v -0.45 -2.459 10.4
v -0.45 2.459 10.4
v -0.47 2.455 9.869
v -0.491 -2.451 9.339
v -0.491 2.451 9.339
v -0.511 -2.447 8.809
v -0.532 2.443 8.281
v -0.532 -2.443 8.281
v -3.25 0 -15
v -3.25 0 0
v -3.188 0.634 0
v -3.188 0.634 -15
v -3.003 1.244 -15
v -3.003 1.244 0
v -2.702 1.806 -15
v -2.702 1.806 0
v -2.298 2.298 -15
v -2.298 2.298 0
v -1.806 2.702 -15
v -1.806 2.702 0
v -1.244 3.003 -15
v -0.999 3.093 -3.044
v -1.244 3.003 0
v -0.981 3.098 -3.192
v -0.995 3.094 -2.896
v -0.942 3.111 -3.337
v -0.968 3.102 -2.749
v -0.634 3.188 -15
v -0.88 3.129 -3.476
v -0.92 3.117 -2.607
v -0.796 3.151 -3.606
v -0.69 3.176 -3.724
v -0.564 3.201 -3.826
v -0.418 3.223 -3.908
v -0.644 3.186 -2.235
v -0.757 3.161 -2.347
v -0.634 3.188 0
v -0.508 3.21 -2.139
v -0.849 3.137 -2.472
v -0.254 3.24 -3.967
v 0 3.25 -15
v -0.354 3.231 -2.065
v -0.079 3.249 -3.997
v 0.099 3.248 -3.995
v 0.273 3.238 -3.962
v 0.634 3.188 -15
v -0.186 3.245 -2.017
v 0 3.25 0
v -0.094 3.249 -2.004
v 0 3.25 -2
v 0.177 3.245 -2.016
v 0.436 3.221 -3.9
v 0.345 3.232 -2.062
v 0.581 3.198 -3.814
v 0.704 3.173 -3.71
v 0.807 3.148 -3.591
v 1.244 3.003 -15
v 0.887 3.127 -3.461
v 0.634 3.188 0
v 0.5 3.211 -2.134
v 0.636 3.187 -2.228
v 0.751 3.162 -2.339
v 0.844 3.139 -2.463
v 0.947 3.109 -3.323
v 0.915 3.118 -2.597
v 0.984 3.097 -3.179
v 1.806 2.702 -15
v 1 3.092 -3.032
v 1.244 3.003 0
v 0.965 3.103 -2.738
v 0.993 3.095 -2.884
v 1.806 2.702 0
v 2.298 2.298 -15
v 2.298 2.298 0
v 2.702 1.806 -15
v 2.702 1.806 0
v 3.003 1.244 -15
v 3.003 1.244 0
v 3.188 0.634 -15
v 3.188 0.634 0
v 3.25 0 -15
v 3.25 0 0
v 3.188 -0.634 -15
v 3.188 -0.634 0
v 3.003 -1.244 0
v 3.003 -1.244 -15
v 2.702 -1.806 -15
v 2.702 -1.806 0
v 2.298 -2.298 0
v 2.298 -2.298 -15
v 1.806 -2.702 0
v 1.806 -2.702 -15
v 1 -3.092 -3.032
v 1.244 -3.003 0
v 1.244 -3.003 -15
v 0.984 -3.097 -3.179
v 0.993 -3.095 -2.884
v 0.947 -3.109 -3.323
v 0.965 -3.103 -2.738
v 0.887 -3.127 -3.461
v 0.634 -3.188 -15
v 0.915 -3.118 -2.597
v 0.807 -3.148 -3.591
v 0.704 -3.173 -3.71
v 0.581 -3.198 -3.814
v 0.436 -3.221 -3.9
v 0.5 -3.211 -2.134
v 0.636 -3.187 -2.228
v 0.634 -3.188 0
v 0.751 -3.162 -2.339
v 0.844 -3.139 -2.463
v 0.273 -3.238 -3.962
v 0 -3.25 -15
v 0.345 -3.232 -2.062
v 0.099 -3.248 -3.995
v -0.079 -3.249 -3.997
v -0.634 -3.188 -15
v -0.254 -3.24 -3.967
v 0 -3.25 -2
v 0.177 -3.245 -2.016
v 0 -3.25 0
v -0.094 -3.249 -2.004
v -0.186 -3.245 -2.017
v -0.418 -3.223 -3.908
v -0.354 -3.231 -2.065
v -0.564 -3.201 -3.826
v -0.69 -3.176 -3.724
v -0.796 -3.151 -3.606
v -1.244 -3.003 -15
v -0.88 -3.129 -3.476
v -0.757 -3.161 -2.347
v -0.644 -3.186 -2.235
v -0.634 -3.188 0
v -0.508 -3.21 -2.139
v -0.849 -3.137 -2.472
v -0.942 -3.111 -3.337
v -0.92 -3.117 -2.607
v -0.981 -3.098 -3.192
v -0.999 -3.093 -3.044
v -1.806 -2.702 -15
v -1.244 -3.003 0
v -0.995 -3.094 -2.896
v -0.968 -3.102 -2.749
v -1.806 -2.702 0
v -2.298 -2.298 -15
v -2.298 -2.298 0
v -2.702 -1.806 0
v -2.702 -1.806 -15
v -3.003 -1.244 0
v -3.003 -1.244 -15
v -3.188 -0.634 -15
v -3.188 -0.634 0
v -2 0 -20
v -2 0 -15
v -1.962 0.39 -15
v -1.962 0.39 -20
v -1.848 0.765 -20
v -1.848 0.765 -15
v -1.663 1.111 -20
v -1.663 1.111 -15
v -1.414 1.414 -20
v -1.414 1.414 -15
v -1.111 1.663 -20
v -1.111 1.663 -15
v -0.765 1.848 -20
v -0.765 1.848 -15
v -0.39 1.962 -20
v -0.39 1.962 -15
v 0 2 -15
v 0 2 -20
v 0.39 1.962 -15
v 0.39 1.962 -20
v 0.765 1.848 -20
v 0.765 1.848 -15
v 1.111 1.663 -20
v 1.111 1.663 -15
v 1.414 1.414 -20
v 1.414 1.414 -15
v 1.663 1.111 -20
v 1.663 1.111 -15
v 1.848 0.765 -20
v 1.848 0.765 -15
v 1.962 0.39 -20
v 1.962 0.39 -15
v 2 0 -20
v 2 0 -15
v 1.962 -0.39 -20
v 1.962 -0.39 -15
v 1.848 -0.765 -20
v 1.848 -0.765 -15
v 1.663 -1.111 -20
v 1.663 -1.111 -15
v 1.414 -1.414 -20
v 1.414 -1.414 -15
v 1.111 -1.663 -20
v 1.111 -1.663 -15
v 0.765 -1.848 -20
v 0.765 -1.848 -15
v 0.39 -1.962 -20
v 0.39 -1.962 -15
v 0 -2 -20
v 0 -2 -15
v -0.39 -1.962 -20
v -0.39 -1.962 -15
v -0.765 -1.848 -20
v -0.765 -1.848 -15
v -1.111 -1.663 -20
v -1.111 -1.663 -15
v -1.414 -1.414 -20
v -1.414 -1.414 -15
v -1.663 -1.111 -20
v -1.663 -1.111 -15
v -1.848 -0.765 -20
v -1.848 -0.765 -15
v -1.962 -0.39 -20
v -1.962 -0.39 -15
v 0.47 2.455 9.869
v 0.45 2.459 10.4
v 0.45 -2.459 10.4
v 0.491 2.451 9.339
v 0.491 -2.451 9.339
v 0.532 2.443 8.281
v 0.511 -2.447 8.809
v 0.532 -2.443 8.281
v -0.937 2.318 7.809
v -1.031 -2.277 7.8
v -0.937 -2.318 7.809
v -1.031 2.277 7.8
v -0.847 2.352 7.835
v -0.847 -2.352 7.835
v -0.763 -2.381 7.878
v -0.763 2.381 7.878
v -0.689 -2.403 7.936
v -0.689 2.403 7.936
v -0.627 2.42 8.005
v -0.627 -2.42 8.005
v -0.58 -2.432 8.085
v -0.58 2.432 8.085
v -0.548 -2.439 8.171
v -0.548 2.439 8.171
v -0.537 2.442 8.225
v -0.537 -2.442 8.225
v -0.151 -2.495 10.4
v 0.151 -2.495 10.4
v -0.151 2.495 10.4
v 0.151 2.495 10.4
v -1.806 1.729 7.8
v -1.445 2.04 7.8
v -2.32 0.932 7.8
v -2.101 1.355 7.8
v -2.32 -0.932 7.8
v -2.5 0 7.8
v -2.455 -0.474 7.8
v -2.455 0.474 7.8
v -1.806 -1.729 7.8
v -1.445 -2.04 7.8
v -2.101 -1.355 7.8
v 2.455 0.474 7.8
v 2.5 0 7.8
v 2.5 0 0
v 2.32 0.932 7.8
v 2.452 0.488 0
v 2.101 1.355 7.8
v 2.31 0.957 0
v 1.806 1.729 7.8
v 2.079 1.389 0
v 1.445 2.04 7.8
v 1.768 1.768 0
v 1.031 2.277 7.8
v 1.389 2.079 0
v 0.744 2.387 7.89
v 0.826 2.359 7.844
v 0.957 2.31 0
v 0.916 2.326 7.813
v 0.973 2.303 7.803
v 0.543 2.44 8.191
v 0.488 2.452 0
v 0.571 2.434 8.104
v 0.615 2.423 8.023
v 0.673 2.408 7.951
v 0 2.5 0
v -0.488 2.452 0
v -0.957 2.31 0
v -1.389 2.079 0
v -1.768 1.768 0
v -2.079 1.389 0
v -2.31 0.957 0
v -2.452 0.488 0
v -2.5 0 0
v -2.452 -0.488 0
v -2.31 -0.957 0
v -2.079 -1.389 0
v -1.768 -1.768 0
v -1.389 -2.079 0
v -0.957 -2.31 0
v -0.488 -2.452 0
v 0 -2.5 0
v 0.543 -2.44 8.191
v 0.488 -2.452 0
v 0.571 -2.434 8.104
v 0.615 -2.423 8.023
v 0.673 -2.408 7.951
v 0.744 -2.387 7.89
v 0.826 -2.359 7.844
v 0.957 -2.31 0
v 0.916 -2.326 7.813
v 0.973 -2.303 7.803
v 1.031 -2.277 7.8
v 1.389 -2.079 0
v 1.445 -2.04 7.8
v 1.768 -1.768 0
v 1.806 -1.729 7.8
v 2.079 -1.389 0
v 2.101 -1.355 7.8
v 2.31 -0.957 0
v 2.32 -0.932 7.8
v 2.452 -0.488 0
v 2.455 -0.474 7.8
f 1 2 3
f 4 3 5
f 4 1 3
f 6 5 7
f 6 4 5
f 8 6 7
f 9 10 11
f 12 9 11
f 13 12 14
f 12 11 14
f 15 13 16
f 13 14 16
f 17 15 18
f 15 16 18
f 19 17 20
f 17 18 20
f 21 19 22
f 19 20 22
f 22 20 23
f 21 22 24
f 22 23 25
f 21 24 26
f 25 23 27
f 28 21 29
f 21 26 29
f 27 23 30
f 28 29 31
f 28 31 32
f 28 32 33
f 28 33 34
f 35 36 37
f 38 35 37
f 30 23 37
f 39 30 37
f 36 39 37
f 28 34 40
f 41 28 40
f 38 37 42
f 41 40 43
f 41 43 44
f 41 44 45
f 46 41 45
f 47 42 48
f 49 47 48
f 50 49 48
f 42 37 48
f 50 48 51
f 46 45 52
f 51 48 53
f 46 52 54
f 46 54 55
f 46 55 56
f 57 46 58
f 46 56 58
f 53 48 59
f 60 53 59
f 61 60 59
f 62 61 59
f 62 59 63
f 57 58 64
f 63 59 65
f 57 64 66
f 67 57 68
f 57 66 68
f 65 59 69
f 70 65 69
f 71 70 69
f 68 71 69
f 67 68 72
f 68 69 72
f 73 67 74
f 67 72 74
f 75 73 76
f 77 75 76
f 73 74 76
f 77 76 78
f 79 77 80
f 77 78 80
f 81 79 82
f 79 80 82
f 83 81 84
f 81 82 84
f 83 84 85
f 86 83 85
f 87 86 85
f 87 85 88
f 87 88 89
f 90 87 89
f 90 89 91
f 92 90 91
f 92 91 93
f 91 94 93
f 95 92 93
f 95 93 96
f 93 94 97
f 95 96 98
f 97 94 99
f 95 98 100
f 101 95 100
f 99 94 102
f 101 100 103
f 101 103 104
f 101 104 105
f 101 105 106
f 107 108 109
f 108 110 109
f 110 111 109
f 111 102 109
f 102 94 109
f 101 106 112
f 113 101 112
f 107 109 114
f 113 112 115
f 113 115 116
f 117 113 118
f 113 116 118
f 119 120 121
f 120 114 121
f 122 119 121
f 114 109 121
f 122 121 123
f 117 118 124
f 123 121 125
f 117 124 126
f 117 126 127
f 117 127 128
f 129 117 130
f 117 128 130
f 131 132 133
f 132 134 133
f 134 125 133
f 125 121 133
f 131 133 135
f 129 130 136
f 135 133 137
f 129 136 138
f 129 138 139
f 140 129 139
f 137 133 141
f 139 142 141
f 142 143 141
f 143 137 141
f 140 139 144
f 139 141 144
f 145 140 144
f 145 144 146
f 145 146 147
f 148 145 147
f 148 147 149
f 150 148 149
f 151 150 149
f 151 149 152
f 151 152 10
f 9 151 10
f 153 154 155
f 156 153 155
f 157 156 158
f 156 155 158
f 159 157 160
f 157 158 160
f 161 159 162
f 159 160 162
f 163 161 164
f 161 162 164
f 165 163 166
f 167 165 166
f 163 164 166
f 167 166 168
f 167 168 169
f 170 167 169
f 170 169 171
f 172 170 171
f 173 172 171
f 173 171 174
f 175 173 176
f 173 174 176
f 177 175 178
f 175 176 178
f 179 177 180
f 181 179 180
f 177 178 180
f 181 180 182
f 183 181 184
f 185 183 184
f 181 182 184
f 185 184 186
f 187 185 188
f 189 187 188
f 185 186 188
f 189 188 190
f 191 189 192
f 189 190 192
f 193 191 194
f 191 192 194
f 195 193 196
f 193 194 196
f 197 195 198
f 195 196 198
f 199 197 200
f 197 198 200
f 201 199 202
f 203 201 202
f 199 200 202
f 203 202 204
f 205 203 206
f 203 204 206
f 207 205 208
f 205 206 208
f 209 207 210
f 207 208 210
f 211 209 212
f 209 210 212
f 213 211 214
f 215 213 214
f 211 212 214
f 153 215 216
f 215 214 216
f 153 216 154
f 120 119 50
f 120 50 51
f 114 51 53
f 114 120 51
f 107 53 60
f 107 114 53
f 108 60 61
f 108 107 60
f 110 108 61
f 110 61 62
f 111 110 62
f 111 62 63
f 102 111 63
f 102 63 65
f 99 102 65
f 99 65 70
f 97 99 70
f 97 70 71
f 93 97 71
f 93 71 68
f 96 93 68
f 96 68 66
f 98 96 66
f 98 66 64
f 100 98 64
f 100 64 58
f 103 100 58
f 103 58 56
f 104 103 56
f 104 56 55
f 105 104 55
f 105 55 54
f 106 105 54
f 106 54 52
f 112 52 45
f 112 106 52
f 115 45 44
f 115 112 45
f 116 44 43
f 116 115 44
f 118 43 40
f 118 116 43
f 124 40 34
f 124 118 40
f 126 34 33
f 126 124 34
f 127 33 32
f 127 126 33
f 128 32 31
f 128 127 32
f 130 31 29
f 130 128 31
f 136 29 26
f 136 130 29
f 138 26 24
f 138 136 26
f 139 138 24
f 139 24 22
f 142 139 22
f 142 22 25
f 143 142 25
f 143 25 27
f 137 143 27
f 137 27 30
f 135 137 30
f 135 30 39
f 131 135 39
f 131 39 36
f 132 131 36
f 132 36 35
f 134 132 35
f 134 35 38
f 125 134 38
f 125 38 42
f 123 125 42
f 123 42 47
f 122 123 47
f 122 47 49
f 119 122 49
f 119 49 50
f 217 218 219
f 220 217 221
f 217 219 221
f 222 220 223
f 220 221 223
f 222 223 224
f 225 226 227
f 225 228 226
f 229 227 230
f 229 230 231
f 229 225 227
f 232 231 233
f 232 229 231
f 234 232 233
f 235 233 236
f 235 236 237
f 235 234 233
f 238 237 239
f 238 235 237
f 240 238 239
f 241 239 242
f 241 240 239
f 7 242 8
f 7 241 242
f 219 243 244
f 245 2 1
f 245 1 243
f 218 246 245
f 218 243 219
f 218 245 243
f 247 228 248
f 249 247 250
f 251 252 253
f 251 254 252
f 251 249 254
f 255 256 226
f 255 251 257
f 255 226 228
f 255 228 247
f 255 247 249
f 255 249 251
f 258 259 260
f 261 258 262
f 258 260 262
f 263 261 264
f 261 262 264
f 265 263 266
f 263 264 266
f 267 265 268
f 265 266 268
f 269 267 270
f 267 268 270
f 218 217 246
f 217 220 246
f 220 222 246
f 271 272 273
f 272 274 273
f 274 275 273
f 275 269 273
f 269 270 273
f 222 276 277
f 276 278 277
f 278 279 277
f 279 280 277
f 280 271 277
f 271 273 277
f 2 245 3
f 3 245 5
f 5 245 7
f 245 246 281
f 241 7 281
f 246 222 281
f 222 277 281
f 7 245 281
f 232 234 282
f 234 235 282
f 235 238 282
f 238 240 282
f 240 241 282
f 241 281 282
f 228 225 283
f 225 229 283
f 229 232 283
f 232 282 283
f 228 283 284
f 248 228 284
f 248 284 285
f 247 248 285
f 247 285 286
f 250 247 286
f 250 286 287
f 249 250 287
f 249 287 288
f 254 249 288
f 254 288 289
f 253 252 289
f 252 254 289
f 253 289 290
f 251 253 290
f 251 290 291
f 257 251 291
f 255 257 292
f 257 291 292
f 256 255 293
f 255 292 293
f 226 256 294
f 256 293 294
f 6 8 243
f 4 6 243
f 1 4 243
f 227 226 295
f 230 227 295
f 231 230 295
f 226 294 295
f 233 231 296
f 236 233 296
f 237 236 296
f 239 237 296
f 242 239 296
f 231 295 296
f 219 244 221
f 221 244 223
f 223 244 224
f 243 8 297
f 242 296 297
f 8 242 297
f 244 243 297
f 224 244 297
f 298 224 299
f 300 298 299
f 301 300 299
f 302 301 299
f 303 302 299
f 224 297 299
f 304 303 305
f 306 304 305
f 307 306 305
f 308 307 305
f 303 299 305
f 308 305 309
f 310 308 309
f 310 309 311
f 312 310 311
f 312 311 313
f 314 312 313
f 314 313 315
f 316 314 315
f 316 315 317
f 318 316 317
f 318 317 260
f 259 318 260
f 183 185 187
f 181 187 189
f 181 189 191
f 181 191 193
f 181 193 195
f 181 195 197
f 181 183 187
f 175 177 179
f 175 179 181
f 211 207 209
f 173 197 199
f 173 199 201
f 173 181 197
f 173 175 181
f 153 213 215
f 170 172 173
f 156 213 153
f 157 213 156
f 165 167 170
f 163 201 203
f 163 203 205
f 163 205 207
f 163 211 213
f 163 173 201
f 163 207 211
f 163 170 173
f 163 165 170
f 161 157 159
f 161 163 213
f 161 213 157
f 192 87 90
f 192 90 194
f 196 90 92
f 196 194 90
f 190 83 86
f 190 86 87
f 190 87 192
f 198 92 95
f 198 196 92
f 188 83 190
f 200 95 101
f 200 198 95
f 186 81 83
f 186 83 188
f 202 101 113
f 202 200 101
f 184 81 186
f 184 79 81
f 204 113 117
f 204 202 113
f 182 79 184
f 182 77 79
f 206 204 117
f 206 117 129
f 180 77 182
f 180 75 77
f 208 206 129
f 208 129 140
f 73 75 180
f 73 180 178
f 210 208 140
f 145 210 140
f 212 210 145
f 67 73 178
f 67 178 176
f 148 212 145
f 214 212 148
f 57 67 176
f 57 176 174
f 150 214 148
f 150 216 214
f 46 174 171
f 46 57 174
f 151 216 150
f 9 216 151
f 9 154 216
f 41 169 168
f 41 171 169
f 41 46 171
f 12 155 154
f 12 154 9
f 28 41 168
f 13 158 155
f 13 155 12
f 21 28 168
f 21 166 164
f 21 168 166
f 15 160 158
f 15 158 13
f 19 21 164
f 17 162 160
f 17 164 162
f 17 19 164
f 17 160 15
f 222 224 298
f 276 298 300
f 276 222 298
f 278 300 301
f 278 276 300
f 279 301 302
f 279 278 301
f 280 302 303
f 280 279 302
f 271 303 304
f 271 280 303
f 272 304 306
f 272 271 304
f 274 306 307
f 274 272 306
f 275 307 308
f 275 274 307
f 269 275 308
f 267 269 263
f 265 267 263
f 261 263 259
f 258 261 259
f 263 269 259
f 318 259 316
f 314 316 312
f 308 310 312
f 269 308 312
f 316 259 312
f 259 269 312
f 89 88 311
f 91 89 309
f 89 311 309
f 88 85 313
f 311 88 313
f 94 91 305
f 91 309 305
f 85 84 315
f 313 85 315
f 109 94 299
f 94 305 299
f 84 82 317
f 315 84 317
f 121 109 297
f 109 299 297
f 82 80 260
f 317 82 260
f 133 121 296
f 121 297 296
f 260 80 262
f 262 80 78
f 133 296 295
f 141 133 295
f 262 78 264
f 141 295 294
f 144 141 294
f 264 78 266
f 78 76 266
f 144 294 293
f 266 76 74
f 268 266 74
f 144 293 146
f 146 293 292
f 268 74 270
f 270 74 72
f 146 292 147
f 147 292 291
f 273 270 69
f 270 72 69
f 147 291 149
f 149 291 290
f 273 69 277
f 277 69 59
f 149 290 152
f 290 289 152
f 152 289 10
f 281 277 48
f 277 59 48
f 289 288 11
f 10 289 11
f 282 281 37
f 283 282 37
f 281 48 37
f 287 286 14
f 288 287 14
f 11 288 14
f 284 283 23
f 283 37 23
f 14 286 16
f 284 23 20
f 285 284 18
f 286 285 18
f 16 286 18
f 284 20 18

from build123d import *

# Parameters (mm, degrees)
SKETCH_1_R               = 2.5
EXTRUDE_1_DEPTH          = 10.4
SKETCH_2_R               = 3.25
EXTRUDE_2_DEPTH          = 15
CUT_EXTRUDE_1_DEPTH      = 16.68837149
CUT_EXTRUDE_1_DEPTH_BACK = 16.68837149
FILLET_1_R               = 0.5
CUT_EXTRUDE_2_DEPTH      = 16.68837149
CUT_EXTRUDE_2_DEPTH_BACK = 16.68837149
SKETCH_5_R               = 1
SKETCH_6_R               = 2
EXTRUDE_3_DEPTH          = 5


with BuildPart() as part:
    # Эскиз1 → Бобышка-Вытянуть1 (new body)
    with BuildSketch(Plane.XY):
        Circle(SKETCH_1_R)
    extrude(amount=EXTRUDE_1_DEPTH)

    # Эскиз2 → Бобышка-Вытянуть2 (add)
    with BuildSketch(Plane(origin=(0, 0, 0), x_dir=(-1, 0, 0), z_dir=(0, 0, -1))):
        Circle(SKETCH_2_R)
    extrude(amount=EXTRUDE_2_DEPTH)

    # Эскиз4 → Вырез-Вытянуть1 (cut, two sides: drawn at the far end of the back side and taken through both)
    with BuildSketch(Plane(origin=(0, 0, 0), x_dir=(1, 0, 0), z_dir=(0, 1, 0)).offset(-CUT_EXTRUDE_1_DEPTH_BACK)):
        Polygon((-0.45, -10.4), (-0.55, -7.8), (-2.5, -7.8), (-2.5, -10.4), align=None)
        Polygon((0.45, -10.4), (0.55, -7.8), (2.5, -7.8), (2.5, -10.4), align=None)
    extrude(amount=CUT_EXTRUDE_1_DEPTH + CUT_EXTRUDE_1_DEPTH_BACK, mode=Mode.SUBTRACT)

    # Скругление1
    fillet_1_edges = [part.edges().sort_by_distance(p)[0] for p in [
        (0.55, 0, 7.8),
        (-0.55, 0, 7.8),
    ]]
    fillet(fillet_1_edges, radius=FILLET_1_R)

    # Эскиз5 → Вырез-Вытянуть2 (cut, two sides: drawn at the far end of the back side and taken through both)
    with BuildSketch(Plane(origin=(0, 0, 0), x_dir=(1, 0, 0), z_dir=(0, 1, 0)).offset(-CUT_EXTRUDE_2_DEPTH_BACK)):
        with Locations(Location((0, 3, 0), (0, 0, 270))):
            Circle(SKETCH_5_R)
    extrude(amount=CUT_EXTRUDE_2_DEPTH + CUT_EXTRUDE_2_DEPTH_BACK, mode=Mode.SUBTRACT)

    # Эскиз6 → Бобышка-Вытянуть3 (add)
    with BuildSketch(Plane(origin=(0, 0, -15), x_dir=(-1, 0, 0), z_dir=(0, 0, -1))):
        Circle(SKETCH_6_R)
    extrude(amount=EXTRUDE_3_DEPTH)


solid = part.part
